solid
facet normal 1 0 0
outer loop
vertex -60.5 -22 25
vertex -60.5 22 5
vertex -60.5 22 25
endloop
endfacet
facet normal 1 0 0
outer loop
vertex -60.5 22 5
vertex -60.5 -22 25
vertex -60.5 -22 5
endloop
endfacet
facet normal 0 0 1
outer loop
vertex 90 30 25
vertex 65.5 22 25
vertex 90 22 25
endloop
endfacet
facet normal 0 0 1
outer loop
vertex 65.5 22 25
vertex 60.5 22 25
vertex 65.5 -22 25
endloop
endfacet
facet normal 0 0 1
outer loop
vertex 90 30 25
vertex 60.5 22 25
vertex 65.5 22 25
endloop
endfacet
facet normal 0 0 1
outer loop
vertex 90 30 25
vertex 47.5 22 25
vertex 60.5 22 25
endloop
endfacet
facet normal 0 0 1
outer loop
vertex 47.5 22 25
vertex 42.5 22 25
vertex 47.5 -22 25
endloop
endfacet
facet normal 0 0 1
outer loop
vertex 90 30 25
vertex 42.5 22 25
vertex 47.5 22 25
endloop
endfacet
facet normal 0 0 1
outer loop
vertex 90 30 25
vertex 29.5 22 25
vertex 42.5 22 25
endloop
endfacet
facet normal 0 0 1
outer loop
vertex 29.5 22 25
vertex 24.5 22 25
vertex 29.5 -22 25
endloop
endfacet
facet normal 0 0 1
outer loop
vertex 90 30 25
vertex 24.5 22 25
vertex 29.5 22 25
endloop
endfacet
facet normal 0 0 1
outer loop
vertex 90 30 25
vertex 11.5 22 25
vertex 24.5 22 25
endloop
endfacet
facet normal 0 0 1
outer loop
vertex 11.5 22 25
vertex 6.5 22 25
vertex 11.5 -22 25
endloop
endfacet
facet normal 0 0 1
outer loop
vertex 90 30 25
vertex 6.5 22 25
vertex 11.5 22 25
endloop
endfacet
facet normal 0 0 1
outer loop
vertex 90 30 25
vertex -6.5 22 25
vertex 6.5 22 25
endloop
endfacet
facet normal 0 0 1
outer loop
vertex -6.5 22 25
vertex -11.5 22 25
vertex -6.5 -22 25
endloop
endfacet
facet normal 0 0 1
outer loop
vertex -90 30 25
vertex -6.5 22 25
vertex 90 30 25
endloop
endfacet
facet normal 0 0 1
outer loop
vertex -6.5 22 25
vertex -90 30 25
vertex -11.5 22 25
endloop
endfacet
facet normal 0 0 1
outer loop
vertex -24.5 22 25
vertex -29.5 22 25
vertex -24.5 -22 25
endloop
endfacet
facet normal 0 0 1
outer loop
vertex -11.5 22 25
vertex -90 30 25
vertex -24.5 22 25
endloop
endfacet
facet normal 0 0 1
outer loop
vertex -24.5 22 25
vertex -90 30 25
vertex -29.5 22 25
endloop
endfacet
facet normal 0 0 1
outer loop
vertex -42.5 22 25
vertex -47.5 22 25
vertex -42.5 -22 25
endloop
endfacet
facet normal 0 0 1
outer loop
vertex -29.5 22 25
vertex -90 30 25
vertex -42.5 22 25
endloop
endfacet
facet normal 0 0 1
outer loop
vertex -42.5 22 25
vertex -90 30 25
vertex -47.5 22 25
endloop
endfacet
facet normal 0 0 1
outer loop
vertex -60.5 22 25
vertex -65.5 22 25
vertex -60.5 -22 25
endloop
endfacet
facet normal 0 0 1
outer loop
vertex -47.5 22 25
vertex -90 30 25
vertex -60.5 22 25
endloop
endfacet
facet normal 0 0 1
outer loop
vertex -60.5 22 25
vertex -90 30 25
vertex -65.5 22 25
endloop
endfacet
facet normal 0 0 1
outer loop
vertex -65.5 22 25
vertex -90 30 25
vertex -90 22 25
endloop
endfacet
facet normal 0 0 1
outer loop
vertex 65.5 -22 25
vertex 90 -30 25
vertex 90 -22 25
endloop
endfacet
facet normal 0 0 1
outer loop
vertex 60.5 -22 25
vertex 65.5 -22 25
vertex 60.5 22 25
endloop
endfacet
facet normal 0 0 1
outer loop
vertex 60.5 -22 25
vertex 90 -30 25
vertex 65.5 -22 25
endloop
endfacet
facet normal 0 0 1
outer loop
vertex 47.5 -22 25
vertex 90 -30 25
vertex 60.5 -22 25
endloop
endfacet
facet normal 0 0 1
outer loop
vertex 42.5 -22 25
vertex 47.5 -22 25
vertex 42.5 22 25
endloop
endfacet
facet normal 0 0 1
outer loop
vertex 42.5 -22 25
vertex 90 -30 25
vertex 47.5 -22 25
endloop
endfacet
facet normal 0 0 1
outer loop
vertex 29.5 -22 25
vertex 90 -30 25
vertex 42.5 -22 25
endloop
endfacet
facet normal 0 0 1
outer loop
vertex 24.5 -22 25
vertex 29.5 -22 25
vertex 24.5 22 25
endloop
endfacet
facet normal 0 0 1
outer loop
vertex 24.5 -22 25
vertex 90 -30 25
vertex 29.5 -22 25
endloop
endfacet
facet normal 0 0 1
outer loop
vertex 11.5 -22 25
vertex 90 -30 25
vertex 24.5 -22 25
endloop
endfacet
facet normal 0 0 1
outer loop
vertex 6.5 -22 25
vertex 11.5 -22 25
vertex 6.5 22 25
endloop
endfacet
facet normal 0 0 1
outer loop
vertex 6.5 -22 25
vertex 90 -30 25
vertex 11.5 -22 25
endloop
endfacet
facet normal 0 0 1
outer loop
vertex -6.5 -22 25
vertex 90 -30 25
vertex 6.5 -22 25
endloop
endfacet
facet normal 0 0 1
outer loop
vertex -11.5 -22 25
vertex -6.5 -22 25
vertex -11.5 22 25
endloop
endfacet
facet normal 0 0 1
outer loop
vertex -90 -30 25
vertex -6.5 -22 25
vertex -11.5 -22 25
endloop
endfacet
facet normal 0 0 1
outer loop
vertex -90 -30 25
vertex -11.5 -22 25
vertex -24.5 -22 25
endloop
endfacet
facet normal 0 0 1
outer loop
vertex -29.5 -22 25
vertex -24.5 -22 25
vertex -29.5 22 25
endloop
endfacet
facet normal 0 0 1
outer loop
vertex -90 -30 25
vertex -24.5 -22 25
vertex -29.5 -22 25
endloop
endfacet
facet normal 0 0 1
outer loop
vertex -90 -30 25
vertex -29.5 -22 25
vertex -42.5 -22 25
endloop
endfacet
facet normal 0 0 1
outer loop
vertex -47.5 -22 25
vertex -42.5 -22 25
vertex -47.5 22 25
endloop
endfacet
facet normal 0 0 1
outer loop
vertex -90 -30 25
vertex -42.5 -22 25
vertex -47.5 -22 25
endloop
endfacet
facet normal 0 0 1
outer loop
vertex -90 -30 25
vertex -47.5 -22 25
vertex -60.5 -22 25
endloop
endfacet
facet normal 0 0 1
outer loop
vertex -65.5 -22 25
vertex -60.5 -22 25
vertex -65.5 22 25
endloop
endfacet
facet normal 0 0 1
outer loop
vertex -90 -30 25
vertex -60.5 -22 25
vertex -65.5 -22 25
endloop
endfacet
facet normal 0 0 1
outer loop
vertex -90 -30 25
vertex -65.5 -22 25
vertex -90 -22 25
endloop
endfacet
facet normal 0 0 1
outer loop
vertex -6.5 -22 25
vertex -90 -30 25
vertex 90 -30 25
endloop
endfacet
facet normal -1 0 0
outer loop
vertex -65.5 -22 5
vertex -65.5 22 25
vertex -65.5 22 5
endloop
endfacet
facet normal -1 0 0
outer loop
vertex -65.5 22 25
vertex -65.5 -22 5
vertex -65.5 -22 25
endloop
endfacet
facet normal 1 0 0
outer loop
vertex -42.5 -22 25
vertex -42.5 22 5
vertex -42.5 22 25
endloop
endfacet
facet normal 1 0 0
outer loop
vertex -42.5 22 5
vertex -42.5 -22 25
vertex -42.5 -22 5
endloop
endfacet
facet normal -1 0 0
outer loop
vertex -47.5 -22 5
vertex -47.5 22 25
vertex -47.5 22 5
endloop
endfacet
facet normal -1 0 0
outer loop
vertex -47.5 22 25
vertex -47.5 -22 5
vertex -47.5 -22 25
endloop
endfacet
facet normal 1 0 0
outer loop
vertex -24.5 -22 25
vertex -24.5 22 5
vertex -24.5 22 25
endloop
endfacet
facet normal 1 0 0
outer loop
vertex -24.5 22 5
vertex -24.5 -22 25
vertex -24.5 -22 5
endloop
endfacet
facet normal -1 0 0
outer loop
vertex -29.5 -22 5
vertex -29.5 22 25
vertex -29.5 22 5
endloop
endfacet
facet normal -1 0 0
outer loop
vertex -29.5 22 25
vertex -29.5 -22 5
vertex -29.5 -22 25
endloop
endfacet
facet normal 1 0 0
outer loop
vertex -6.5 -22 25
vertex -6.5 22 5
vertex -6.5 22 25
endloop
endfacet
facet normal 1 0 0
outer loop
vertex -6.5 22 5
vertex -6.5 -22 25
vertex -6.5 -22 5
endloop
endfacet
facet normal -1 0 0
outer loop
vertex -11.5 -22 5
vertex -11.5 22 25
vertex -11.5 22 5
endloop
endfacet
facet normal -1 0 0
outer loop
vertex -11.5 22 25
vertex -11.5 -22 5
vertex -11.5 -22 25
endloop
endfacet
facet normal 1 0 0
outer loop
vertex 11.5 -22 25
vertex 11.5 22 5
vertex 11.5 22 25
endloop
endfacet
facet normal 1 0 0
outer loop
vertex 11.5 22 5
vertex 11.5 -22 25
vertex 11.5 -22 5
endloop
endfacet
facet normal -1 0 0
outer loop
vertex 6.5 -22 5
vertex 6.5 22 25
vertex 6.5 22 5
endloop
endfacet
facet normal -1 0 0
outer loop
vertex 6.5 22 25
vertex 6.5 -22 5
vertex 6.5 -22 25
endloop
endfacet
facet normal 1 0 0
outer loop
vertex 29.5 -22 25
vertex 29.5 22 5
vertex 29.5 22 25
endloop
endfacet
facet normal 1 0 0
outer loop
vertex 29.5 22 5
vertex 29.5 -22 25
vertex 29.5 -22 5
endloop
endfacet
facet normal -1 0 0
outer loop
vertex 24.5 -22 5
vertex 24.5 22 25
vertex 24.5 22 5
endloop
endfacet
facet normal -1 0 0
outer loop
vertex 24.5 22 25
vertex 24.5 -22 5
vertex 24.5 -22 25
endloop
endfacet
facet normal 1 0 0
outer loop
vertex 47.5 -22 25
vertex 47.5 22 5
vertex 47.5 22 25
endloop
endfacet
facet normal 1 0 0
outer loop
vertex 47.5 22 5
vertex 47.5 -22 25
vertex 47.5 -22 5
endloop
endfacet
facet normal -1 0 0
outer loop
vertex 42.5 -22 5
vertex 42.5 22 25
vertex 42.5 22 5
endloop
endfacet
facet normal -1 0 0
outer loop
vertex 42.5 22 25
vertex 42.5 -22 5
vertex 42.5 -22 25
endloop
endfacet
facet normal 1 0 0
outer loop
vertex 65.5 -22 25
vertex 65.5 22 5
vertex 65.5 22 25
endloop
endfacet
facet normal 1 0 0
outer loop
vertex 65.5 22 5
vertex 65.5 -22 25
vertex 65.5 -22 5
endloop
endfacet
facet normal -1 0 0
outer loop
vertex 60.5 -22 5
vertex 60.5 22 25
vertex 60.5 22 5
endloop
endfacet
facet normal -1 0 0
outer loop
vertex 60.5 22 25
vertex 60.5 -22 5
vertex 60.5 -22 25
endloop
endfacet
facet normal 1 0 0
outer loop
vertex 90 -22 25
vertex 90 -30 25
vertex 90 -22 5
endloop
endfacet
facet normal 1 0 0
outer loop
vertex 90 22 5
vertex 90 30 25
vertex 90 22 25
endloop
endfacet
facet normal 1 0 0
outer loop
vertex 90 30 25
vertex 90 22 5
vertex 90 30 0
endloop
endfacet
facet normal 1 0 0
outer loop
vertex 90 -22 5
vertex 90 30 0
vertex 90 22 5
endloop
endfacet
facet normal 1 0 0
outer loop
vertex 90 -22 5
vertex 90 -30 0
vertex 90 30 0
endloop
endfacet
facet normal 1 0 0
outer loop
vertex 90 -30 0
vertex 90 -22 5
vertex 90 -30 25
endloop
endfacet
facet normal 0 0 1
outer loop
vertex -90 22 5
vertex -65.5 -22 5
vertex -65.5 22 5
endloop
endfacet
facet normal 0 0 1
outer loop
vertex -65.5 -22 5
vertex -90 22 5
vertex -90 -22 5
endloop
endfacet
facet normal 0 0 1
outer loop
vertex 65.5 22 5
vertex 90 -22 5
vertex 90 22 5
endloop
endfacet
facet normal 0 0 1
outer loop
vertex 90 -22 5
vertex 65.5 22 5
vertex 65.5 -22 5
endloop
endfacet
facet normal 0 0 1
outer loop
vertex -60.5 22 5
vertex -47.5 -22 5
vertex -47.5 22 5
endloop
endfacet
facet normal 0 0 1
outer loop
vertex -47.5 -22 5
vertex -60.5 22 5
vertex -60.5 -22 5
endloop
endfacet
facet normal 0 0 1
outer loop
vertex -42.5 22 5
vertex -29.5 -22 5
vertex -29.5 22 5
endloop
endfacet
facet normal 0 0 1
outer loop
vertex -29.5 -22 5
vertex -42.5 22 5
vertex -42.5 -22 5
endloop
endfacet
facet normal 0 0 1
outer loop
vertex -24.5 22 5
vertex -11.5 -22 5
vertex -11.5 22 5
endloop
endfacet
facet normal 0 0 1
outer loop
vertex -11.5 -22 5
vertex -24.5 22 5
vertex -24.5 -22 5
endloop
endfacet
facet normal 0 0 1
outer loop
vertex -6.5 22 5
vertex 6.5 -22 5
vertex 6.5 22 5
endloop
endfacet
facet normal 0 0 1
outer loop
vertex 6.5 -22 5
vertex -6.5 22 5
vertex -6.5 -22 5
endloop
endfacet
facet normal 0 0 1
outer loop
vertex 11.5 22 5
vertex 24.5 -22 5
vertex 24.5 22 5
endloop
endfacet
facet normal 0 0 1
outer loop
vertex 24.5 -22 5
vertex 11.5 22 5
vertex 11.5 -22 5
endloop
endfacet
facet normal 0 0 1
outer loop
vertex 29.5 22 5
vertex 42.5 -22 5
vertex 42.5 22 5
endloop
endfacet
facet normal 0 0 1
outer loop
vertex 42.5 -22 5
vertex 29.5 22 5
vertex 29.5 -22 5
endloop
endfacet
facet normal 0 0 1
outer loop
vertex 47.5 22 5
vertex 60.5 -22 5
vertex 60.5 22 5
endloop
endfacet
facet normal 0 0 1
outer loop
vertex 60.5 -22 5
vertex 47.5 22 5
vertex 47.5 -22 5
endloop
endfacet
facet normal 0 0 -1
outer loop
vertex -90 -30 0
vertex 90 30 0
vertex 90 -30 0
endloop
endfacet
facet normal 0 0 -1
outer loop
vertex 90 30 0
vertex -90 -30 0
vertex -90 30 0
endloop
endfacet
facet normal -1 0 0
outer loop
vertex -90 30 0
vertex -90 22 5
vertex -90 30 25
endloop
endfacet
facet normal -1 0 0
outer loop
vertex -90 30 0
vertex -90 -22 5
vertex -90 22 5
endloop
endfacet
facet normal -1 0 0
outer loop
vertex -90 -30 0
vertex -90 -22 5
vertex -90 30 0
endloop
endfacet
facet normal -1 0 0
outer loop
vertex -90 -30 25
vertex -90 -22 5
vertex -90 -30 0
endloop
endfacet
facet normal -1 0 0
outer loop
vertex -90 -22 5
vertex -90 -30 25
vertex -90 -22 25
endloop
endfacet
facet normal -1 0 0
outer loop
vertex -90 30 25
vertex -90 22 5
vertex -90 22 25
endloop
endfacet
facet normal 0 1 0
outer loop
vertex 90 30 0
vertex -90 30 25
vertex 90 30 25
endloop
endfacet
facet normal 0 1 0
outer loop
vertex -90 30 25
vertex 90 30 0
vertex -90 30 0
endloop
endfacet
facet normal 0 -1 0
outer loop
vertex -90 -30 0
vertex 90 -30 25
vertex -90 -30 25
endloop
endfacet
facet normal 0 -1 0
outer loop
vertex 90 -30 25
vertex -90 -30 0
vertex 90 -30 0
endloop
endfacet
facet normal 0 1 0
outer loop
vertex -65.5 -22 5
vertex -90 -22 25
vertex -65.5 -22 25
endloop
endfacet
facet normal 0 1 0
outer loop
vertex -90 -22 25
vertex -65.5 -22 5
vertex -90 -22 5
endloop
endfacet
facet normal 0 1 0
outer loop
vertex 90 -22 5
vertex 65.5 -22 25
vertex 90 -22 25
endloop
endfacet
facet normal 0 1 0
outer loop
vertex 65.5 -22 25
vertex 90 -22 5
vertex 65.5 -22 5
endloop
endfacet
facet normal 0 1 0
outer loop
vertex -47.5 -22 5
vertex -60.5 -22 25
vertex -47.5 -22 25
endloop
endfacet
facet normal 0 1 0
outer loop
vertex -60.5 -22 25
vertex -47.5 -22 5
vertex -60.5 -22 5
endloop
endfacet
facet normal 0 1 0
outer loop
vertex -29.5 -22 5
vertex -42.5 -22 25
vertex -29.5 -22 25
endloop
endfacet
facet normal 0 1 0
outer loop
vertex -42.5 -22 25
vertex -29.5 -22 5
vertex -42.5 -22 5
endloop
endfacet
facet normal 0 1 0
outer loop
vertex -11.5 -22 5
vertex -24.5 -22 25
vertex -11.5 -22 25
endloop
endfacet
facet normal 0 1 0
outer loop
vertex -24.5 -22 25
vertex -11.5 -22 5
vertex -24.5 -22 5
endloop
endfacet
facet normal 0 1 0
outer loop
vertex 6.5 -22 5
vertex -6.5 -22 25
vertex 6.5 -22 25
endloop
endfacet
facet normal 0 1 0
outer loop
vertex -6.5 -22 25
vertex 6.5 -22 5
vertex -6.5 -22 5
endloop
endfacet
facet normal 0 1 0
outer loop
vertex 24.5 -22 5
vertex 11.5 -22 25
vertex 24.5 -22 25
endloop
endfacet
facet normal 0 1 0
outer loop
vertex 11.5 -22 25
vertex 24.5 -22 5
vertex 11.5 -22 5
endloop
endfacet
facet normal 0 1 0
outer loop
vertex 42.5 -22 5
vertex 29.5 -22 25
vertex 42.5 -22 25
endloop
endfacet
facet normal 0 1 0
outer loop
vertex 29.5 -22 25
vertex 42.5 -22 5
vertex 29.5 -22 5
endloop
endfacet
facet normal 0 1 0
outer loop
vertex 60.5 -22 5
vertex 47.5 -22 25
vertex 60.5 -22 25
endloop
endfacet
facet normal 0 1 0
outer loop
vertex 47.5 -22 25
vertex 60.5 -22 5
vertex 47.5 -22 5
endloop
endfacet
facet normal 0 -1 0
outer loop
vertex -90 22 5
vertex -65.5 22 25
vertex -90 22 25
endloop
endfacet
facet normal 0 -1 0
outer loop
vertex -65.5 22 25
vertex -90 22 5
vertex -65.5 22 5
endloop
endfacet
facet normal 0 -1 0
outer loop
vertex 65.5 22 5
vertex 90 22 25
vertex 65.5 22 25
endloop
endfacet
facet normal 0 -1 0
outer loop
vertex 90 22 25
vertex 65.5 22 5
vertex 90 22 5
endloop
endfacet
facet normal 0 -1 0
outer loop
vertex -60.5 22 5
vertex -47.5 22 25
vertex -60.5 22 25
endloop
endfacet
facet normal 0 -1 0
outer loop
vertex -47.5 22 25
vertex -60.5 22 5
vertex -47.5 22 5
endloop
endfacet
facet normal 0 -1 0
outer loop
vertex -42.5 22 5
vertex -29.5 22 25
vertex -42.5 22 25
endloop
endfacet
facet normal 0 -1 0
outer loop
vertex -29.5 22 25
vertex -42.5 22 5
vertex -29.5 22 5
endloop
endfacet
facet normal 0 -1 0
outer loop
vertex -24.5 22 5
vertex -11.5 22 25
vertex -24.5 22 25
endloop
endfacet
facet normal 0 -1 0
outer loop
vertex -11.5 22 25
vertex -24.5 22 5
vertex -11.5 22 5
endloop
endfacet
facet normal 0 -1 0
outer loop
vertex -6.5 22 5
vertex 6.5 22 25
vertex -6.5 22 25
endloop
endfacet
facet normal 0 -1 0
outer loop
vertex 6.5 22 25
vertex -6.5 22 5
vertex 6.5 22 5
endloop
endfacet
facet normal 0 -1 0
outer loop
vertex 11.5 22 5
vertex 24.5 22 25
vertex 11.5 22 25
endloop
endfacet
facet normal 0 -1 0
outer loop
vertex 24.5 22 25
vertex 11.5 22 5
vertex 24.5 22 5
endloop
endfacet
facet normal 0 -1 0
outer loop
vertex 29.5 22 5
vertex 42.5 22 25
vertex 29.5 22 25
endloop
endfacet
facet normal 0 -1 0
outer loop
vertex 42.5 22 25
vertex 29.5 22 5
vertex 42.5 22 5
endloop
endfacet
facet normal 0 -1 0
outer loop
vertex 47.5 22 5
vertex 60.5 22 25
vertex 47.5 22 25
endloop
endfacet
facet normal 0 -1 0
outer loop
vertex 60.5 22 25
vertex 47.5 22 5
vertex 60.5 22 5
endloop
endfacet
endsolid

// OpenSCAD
$fn = 32;

// ----------------------------------------------------------------------
// Rib frame 180 x 60 x 25
// 8 ribs at 18 mm pitch
// ----------------------------------------------------------------------

// --- parameters (mm) ---
frame = [180, 60, 5];  // base plate size (x, y, z)
rail_w = 8;            // side rail width
ribs = 8;              // number of ribs
rib_t = 5;             // rib thickness
rib_h = 20;            // rib height above the base plate
pitch = 18;            // pitch between rib centres

// --- derived feature positions (mm) ---
span = (ribs - 1) * pitch;          // = 126   distance between the outer ribs
origin_x = -span / 2;               // = -63   X of the first rib
rib_len = frame[1] - 2 * rail_w + 2;  // = 46   rib length, 1 mm into each rail
feature_centers = [
  [origin_x + 0 * pitch, 0],
  [origin_x + 1 * pitch, 0],
  [origin_x + 2 * pitch, 0],
  [origin_x + 3 * pitch, 0],
  [origin_x + 4 * pitch, 0],
  [origin_x + 5 * pitch, 0],
  [origin_x + 6 * pitch, 0],
  [origin_x + 7 * pitch, 0]
];   // rib centre line, drives the rib loop

// base plate, two side rails, then the ribs read straight off feature_centers
union() {
  translate([-frame[0] / 2, -frame[1] / 2, 0]) cube(frame);
  translate([-frame[0] / 2, -frame[1] / 2, 0]) cube([frame[0], rail_w, frame[2] + rib_h]);
  translate([-frame[0] / 2, frame[1] / 2 - rail_w, 0]) cube([frame[0], rail_w, frame[2] + rib_h]);
  for (centre = feature_centers)
    translate([centre[0] - rib_t / 2, centre[1] - rib_len / 2, frame[2] - 1])
      cube([rib_t, rib_len, rib_h + 1]);
}
